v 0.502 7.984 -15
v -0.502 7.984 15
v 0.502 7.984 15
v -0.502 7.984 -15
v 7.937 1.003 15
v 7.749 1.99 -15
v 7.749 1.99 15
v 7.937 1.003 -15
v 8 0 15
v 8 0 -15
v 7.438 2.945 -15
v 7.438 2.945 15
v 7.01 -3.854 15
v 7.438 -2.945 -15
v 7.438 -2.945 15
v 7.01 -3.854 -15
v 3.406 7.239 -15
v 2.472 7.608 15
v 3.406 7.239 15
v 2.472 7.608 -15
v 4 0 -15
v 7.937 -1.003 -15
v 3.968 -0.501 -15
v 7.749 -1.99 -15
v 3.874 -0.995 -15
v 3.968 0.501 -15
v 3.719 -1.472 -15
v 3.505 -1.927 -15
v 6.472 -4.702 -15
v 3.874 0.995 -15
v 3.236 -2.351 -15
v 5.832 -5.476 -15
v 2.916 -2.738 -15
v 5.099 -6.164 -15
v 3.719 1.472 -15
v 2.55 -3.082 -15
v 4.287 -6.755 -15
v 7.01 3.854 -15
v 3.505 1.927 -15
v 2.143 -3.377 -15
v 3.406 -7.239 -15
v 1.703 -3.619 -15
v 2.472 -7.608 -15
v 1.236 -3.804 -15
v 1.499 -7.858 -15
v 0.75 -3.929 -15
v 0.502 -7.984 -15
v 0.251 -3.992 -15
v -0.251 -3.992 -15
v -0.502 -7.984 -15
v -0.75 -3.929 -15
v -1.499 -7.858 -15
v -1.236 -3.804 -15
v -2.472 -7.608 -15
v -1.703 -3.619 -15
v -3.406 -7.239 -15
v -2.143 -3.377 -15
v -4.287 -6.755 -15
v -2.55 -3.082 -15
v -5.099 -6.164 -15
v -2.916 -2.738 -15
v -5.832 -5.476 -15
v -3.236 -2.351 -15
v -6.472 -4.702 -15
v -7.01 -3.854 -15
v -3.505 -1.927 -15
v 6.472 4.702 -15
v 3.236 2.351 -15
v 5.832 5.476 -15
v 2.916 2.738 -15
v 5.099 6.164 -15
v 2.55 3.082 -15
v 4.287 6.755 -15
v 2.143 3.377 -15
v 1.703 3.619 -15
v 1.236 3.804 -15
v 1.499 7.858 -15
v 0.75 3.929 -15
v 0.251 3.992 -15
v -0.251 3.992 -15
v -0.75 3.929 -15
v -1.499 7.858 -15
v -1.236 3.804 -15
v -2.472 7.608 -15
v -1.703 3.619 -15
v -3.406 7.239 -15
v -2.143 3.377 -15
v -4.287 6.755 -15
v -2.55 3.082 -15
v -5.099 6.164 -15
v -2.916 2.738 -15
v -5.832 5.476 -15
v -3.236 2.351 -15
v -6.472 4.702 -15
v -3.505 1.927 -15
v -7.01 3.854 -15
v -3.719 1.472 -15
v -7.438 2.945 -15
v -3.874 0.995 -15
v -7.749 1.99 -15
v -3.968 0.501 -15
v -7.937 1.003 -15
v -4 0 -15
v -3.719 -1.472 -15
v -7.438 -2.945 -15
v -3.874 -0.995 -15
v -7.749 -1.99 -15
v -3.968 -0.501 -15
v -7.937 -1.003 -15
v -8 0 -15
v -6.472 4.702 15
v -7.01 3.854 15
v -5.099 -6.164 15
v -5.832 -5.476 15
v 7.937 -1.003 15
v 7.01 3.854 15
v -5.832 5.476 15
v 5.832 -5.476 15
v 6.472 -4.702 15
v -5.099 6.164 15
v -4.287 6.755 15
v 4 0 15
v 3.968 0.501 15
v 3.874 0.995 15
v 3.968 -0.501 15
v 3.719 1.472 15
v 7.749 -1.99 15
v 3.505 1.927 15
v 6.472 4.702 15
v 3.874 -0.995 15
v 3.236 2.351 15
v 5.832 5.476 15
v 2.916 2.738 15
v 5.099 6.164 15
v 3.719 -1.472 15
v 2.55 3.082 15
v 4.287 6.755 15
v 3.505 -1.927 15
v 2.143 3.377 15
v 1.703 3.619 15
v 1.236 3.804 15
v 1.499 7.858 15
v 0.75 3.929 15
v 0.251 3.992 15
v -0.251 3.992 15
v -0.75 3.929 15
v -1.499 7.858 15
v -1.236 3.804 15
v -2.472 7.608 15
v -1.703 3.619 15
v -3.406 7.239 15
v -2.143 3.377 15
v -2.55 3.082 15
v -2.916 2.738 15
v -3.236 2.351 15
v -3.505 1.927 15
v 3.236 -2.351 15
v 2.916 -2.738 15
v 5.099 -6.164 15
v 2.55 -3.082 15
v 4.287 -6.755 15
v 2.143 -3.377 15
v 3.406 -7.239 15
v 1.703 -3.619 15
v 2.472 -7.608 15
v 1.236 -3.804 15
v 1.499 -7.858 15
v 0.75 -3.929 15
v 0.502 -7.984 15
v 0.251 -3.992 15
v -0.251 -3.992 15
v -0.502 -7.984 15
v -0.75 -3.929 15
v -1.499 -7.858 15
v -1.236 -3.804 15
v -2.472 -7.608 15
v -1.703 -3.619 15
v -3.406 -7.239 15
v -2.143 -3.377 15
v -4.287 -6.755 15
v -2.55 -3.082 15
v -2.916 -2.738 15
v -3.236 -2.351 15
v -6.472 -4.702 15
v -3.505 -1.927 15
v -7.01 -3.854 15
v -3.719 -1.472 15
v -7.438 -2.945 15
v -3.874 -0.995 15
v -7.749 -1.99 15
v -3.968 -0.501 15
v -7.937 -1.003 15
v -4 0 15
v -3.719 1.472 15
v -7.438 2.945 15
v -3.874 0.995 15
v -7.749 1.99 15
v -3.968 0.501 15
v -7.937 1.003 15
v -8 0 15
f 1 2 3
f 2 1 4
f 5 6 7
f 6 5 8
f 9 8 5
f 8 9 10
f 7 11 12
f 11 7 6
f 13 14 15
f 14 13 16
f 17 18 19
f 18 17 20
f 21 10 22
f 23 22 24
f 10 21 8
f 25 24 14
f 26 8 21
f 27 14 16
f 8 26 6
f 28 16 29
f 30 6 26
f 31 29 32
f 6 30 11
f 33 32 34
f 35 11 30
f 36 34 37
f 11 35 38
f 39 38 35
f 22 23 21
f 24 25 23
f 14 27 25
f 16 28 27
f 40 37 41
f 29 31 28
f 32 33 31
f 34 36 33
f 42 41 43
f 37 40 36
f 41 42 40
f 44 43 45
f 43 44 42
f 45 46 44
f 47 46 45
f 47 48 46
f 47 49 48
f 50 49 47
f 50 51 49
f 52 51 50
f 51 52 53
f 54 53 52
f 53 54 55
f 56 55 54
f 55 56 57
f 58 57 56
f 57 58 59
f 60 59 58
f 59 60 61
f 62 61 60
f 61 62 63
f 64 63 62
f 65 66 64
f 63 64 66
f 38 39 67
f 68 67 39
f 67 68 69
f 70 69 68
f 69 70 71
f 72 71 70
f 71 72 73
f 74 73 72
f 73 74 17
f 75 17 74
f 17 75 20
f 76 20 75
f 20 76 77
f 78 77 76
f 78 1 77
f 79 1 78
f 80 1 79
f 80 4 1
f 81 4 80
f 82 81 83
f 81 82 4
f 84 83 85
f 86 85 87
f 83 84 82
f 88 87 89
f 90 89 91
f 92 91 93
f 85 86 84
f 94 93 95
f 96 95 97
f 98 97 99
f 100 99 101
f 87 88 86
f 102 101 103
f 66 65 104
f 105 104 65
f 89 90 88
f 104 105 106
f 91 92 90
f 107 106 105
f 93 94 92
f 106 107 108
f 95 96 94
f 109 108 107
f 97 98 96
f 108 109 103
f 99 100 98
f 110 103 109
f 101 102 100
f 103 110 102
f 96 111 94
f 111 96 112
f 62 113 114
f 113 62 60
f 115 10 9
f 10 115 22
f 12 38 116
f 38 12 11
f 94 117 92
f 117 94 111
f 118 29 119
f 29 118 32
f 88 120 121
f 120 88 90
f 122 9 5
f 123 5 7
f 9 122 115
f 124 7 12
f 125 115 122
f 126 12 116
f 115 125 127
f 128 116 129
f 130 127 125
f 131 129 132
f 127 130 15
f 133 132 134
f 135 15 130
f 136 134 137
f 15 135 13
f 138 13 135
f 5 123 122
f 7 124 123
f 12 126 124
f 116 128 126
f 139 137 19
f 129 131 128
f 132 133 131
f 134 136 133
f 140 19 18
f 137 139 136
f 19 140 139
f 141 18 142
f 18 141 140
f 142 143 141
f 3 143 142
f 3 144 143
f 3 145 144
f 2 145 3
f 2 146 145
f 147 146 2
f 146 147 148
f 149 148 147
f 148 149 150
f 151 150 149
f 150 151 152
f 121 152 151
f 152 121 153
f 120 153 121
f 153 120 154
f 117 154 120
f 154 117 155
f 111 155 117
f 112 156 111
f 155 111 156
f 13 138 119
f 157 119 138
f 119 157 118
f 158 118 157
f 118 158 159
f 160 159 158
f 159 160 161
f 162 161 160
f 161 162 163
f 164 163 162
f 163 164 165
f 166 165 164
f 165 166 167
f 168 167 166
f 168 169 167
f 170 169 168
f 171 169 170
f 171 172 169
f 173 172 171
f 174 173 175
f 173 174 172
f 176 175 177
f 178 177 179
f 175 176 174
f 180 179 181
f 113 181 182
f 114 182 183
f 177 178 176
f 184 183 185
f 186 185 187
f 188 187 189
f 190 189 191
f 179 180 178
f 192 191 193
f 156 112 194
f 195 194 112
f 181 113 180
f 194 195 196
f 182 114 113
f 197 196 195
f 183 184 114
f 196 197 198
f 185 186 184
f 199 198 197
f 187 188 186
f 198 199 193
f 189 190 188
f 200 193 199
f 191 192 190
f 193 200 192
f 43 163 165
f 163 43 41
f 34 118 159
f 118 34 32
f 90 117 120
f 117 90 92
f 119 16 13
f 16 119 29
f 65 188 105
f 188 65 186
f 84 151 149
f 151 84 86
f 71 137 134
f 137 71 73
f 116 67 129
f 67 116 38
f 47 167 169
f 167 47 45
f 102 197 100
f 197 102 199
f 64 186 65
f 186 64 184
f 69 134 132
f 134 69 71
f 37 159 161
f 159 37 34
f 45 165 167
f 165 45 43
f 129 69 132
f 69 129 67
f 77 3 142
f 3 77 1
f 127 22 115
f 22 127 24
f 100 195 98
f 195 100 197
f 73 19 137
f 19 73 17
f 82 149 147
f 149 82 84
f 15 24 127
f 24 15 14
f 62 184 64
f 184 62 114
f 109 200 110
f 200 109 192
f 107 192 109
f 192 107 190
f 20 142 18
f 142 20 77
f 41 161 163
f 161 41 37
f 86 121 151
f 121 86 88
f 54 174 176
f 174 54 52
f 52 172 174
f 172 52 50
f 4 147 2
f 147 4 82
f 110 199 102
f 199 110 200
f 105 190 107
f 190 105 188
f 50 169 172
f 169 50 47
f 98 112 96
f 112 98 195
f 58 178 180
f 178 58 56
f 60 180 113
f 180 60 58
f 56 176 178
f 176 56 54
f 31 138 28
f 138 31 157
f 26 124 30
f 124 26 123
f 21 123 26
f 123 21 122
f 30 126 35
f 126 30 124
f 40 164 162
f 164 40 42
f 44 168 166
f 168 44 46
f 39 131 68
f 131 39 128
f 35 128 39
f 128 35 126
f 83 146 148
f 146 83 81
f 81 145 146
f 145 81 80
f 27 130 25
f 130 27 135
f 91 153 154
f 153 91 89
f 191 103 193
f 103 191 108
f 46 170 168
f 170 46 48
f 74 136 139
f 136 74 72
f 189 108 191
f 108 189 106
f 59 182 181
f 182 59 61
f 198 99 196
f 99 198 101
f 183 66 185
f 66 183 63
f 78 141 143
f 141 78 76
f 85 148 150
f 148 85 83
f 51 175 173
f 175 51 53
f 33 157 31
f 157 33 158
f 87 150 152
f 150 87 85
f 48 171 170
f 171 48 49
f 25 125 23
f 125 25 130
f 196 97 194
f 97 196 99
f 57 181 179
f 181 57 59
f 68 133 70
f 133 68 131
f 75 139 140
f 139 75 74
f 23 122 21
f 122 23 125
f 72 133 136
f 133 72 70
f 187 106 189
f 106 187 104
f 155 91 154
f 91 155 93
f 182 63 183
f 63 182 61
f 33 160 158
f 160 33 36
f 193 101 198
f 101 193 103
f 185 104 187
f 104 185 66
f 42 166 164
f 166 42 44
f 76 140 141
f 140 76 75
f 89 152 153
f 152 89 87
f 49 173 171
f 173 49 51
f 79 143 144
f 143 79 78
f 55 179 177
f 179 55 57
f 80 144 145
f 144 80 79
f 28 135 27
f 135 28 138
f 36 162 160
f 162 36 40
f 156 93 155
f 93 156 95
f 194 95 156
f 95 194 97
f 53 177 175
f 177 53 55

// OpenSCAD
$fn = 50;


difference() {
	union() {
		translate(v = [0, 0, -15.0000000000]) {
			cylinder(h = 30, r = 8.0000000000);
		}
	}
	union() {
		translate(v = [0, 0, -100.0000000000]) {
			cylinder(h = 200, r = 4.0000000000);
		}
	}
}
